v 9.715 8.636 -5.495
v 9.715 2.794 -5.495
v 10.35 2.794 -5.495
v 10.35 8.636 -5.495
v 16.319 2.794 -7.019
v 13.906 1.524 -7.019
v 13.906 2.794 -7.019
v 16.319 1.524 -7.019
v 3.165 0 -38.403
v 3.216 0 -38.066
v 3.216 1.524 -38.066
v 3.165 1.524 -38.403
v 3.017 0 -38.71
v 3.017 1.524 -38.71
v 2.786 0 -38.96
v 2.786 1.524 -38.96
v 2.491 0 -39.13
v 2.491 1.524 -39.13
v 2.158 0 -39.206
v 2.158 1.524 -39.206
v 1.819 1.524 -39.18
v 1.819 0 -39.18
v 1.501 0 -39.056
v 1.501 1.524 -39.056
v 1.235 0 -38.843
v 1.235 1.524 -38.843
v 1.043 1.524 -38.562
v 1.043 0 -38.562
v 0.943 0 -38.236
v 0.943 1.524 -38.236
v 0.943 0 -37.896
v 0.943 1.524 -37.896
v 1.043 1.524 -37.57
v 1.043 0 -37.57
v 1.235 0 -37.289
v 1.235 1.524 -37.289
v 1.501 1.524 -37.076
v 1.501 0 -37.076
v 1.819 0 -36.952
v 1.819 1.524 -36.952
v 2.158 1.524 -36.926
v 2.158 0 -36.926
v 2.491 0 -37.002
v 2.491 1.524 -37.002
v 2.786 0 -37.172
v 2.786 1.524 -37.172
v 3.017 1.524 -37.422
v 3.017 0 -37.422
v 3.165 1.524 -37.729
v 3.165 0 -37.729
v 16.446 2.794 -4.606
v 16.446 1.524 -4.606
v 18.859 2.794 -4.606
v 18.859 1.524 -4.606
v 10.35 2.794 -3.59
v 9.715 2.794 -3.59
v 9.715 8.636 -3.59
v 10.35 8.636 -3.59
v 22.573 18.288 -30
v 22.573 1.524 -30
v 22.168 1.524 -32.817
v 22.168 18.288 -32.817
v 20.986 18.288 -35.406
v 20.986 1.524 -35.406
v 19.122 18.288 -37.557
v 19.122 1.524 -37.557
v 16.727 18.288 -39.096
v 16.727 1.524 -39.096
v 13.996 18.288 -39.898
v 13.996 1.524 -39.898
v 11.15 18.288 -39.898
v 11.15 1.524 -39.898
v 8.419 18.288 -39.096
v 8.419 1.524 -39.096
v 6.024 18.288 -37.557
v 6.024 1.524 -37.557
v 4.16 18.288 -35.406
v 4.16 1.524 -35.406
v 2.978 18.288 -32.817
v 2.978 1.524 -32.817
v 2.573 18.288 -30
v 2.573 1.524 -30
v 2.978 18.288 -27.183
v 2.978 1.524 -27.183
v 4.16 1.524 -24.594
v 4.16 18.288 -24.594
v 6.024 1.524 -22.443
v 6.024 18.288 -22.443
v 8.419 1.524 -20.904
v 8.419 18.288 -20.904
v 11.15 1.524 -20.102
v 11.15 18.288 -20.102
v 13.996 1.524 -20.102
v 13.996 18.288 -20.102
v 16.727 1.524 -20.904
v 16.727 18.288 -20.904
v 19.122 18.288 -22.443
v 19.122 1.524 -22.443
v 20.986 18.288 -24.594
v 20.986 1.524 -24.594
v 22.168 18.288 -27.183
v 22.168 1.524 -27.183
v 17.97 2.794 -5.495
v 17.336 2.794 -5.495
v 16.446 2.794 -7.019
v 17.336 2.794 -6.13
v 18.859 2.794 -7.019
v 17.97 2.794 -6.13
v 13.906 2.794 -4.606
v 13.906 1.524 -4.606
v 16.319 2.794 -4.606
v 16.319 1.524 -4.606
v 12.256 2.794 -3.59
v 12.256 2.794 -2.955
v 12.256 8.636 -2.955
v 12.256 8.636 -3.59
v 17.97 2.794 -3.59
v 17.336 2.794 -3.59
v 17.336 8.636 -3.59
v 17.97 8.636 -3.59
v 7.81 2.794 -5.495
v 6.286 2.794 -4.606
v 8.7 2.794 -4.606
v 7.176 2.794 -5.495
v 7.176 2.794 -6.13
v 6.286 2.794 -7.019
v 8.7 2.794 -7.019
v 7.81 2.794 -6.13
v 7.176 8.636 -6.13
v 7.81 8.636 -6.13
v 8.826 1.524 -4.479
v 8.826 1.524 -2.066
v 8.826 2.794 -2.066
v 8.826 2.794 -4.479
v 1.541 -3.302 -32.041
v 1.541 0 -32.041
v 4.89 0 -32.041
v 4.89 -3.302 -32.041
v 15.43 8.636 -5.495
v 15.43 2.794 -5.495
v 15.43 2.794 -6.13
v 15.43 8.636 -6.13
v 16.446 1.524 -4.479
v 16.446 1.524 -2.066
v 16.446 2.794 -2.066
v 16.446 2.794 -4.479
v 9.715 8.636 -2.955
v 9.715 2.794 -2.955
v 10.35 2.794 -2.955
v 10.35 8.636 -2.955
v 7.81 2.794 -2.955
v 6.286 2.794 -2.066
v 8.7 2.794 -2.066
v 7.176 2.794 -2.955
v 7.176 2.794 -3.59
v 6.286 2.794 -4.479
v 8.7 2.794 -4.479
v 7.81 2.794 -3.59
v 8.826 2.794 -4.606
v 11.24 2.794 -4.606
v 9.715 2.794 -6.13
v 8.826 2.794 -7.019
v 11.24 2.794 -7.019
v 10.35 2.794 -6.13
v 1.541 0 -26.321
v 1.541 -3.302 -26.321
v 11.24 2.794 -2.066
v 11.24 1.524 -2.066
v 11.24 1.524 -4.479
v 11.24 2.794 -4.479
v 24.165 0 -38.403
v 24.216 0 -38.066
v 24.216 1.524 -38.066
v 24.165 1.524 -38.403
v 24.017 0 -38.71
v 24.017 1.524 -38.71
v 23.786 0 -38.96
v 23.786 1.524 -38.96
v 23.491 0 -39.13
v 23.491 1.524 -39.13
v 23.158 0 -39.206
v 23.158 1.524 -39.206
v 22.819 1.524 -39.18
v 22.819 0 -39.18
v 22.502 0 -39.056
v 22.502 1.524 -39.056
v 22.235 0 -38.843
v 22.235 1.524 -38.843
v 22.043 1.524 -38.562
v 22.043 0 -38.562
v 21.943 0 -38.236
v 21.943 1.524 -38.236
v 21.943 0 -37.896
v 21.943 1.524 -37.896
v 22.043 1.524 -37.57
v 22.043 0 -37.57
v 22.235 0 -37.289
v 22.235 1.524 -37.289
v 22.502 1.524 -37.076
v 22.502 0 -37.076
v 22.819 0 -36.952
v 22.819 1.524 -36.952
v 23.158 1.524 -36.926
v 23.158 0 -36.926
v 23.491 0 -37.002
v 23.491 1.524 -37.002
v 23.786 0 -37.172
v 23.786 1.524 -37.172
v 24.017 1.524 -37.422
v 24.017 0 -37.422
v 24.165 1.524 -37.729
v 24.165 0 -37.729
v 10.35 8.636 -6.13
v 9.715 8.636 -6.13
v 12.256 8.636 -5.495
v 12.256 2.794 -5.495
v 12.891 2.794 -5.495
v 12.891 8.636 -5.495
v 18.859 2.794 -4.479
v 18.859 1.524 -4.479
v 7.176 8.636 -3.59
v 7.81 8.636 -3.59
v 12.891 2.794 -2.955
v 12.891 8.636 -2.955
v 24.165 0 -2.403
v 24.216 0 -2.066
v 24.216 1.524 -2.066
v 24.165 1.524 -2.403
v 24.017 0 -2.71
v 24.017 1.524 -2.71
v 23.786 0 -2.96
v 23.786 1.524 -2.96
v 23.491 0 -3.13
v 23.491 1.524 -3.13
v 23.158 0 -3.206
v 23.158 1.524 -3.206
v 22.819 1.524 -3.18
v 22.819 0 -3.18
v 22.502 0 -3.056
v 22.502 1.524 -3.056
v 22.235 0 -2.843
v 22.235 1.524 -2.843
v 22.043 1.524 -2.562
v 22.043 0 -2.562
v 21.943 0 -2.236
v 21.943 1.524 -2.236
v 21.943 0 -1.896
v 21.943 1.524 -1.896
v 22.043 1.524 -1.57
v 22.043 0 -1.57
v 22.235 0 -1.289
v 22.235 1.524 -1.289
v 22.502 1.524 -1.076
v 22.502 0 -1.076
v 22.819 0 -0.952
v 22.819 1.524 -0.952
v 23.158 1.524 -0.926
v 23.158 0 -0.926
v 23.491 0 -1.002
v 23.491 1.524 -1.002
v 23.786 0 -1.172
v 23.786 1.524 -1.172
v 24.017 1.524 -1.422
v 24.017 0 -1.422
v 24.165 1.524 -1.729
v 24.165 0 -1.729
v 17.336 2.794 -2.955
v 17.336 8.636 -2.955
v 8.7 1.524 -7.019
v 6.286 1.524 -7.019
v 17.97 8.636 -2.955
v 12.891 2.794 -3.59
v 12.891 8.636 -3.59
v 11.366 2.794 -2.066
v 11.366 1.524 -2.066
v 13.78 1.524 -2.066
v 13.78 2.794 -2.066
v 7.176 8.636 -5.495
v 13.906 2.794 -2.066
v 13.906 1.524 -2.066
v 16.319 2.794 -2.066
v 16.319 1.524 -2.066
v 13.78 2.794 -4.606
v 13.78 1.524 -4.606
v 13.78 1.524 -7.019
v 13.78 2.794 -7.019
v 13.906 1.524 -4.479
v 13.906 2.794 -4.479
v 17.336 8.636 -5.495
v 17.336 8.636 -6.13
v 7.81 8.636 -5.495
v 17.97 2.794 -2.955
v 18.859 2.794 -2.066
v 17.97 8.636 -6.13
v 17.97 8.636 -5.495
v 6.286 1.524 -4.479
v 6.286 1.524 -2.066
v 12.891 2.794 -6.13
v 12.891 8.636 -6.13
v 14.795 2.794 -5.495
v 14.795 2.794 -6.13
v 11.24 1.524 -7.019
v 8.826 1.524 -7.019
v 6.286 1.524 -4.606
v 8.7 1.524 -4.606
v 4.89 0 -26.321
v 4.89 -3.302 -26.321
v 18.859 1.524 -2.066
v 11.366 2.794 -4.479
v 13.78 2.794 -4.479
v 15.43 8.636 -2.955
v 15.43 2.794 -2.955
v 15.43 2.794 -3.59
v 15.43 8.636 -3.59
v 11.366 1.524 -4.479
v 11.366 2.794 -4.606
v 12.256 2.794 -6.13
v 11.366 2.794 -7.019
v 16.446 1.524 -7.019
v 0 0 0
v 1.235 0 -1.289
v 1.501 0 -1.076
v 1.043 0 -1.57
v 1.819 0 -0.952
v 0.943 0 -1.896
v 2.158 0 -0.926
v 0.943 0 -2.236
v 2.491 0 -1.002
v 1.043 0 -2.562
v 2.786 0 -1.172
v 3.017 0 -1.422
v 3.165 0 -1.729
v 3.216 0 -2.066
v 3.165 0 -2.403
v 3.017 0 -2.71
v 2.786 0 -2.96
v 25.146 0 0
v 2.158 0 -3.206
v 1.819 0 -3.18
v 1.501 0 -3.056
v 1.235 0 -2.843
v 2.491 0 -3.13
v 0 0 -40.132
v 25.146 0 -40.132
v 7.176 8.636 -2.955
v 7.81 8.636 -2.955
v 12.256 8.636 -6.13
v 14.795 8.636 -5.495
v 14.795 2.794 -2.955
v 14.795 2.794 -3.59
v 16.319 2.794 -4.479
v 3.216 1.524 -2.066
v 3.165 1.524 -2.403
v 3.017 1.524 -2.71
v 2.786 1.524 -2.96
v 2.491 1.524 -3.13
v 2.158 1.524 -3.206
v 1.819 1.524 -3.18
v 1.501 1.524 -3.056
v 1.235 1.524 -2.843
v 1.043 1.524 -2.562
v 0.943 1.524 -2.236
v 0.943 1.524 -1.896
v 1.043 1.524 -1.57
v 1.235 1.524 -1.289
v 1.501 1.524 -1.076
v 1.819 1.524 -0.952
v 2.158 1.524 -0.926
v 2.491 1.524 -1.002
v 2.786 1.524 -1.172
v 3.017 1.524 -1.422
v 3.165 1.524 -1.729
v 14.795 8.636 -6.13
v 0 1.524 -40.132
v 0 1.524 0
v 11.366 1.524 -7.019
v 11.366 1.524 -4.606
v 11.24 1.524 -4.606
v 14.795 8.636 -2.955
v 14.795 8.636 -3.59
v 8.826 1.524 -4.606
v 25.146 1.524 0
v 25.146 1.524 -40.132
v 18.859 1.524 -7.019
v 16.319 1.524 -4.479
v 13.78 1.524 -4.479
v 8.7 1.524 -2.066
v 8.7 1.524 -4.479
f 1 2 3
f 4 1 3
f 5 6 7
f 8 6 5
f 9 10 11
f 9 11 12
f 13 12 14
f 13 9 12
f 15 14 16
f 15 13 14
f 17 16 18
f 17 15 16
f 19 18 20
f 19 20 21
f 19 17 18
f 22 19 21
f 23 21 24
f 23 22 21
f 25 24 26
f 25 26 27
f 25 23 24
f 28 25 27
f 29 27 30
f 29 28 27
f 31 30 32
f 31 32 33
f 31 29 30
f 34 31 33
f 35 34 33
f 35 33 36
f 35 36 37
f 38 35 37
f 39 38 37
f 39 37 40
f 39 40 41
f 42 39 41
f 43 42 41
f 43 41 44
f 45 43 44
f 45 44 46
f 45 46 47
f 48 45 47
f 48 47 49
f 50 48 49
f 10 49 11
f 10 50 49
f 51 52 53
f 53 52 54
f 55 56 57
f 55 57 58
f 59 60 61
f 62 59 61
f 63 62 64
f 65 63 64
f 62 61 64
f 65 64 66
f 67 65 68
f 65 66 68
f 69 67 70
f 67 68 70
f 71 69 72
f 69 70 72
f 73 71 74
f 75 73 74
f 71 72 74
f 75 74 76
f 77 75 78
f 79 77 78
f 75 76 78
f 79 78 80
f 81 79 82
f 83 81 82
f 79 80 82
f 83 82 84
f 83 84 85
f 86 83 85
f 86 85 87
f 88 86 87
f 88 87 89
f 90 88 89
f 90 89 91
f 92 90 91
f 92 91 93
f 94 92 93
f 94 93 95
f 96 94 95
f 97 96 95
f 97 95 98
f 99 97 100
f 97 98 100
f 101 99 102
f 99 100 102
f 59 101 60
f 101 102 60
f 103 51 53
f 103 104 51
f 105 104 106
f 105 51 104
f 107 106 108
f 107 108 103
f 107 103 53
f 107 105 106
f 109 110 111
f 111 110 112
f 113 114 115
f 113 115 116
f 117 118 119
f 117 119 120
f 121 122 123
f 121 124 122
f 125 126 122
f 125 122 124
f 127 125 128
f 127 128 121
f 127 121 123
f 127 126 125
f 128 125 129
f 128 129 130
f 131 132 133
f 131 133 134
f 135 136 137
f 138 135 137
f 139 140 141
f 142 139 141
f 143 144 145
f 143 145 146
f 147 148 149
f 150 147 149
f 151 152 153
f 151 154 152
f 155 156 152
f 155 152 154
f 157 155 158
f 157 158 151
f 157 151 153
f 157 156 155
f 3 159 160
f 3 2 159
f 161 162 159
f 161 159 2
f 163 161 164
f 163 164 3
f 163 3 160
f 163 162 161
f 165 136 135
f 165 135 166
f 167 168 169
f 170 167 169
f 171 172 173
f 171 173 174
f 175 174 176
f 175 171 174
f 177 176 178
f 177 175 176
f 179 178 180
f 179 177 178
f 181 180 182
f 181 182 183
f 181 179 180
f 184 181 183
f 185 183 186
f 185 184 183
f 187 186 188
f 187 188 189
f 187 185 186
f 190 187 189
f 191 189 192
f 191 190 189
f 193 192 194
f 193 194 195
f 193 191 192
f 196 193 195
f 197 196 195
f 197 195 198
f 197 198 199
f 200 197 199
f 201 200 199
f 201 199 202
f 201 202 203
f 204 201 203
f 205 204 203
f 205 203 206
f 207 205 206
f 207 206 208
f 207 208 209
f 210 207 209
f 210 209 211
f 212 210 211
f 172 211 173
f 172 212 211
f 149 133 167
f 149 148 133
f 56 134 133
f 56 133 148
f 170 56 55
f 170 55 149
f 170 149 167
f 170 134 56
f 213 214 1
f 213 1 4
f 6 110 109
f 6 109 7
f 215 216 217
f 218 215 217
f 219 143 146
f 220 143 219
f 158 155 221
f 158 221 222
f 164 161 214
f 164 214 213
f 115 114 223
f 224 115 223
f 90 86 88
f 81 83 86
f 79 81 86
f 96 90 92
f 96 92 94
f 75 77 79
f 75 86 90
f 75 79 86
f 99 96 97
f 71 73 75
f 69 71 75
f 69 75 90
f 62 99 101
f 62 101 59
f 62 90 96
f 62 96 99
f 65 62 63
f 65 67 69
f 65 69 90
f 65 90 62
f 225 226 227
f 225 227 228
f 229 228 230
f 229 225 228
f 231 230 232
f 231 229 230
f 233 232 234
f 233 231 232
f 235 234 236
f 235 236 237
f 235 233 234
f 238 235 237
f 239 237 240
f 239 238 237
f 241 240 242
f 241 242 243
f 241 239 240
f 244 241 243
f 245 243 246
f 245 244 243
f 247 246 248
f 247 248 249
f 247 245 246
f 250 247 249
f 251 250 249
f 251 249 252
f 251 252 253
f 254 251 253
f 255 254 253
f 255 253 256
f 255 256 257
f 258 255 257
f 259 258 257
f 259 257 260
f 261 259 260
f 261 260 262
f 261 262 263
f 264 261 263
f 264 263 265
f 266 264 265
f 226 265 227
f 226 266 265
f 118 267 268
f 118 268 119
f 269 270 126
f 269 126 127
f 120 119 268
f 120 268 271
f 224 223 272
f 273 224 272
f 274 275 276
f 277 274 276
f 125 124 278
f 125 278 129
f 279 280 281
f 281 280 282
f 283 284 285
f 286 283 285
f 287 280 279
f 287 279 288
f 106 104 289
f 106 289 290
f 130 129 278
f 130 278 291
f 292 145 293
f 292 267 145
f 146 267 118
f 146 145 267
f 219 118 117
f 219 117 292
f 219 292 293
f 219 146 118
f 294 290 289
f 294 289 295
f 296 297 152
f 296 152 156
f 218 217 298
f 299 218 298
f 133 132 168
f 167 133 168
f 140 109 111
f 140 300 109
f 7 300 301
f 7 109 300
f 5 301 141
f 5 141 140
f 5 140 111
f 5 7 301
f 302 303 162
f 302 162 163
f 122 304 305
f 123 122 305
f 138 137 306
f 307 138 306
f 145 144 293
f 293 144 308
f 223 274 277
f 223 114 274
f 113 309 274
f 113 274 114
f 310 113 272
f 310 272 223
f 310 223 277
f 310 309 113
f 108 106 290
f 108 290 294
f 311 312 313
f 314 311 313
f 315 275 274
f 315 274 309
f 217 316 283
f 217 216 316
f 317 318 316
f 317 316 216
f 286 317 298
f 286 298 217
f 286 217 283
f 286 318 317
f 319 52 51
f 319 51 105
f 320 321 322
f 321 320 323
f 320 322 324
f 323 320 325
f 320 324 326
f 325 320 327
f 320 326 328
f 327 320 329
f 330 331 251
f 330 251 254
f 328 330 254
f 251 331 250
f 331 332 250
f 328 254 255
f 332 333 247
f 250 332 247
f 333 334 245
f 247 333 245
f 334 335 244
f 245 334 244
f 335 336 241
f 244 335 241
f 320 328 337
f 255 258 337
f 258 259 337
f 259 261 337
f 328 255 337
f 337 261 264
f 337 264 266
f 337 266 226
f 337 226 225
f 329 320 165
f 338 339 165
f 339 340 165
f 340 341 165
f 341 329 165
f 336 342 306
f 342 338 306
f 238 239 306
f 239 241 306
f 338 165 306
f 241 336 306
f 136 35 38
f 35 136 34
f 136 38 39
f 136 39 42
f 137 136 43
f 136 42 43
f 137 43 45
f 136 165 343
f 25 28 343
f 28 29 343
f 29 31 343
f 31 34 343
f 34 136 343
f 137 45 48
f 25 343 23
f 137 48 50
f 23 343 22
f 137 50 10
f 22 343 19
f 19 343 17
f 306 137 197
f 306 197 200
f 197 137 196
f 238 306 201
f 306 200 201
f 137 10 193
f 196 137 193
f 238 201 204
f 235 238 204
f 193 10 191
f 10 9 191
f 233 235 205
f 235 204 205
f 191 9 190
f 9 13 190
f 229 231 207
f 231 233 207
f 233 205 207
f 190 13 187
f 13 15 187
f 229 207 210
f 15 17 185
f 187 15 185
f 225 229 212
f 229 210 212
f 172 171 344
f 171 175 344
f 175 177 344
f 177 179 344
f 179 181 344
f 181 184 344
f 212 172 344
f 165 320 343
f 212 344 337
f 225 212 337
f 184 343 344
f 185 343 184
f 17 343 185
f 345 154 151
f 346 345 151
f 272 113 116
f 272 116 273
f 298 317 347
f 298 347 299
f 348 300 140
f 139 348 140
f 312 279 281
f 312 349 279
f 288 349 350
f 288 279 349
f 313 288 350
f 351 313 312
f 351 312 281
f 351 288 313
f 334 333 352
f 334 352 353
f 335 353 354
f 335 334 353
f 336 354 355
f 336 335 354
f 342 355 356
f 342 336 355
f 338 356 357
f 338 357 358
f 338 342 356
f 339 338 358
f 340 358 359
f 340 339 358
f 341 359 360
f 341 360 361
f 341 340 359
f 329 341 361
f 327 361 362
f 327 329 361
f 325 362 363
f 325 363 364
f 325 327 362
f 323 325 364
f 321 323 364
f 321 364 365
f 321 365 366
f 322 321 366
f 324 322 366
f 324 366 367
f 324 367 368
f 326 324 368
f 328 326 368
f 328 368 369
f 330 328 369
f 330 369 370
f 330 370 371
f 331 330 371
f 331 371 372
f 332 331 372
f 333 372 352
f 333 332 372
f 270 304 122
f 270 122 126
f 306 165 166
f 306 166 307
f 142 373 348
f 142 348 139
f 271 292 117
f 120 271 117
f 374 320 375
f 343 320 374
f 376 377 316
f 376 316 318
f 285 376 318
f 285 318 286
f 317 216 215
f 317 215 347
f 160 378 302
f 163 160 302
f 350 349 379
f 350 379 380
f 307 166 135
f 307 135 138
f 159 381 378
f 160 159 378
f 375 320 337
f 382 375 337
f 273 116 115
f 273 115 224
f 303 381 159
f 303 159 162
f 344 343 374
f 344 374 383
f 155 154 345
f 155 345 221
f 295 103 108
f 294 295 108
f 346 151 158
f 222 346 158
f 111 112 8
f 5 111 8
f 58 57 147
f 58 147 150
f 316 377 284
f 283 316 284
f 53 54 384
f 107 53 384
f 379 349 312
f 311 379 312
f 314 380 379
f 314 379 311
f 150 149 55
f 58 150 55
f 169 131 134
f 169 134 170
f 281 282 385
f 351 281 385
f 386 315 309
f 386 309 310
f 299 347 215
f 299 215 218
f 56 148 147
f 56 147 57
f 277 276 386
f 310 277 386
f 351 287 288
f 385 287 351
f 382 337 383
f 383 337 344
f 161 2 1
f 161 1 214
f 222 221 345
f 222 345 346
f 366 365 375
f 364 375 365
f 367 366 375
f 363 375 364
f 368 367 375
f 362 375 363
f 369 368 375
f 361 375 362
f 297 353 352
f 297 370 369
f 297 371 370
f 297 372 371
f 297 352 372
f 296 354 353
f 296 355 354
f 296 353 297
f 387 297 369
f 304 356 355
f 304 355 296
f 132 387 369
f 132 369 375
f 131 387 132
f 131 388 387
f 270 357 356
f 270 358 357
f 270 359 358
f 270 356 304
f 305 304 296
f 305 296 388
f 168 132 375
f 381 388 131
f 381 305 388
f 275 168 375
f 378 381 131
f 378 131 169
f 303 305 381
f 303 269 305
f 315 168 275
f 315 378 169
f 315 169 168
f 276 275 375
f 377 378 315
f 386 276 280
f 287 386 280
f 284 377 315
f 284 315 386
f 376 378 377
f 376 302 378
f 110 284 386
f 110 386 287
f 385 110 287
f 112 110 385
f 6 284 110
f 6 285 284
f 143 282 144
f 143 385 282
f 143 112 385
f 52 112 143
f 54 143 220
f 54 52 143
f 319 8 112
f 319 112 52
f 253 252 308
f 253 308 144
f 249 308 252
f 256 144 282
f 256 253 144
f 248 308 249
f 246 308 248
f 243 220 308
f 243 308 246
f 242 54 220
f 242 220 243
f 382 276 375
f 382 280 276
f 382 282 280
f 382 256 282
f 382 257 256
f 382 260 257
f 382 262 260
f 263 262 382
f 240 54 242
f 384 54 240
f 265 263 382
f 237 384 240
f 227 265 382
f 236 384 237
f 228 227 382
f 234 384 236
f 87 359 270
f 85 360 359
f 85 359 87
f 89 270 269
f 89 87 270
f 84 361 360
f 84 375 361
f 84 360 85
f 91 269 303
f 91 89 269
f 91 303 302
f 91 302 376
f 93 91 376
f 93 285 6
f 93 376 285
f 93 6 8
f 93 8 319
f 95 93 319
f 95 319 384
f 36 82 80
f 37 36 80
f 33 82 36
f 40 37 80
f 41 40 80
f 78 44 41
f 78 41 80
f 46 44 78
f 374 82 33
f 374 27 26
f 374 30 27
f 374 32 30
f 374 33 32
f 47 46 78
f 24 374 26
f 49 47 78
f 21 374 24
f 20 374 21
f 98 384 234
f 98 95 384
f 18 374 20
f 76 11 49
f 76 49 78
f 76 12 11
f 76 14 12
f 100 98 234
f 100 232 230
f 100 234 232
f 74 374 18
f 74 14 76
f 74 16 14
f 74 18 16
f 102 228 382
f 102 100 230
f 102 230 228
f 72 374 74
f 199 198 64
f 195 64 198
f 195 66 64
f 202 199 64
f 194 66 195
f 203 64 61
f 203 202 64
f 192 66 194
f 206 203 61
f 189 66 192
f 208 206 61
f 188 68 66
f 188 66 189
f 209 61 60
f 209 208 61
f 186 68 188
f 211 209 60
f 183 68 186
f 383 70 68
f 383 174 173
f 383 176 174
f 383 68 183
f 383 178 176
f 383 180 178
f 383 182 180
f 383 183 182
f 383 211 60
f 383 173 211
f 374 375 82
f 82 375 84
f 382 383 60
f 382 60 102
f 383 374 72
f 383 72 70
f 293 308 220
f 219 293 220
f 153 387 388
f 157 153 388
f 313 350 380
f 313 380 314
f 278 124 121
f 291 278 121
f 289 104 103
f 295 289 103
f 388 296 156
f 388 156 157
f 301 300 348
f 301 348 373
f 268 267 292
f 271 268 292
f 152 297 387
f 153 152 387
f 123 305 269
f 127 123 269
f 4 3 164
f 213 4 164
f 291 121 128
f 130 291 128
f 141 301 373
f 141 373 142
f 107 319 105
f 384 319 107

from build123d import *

# Parameters (mm, degrees)
SKETCH1_W           = 25.146
SKETCH1_H           = 40.132
SKETCH1_R           = 1.143
BOSS_EXTRUDE1_DEPTH = 1.524
SKETCH2_R           = 10
BOSS_EXTRUDE2_DEPTH = 16.764
SKETCH3_W           = 2.413
SKETCH3_H           = 2.413
BOSS_EXTRUDE3_DEPTH = 1.27
SKETCH4_W           = 0.635
SKETCH4_H           = 0.635
BOSS_EXTRUDE4_DEPTH = 5.842
SKETCH5_W           = 3.348930747
SKETCH5_H           = 5.720091757
BOSS_EXTRUDE5_DEPTH = 3.302


with BuildPart() as part:
    # Sketch1 → Boss-Extrude1 (new body)
    with BuildSketch(Plane(origin=(0, 0, 0), x_dir=(1, 0, 0), z_dir=(0, 1, 0))):
        with Locations((12.573, 20.066)):
            Rectangle(SKETCH1_W, SKETCH1_H)
        with Locations((2.073, 38.066)):
            Circle(SKETCH1_R, mode=Mode.SUBTRACT)
        with Locations((23.073, 38.066)):
            Circle(SKETCH1_R, mode=Mode.SUBTRACT)
        with Locations((23.073, 2.066)):
            Circle(SKETCH1_R, mode=Mode.SUBTRACT)
        with Locations((2.073, 2.066)):
            Circle(SKETCH1_R, mode=Mode.SUBTRACT)
    extrude(amount=BOSS_EXTRUDE1_DEPTH)

    # Sketch2 → Boss-Extrude2 (add)
    with BuildSketch(Plane(origin=(0, 1.524, 0), x_dir=(1, 0, 0), z_dir=(0, 1, 0))):
        with Locations((12.573, 30)):
            Circle(SKETCH2_R)
    extrude(amount=BOSS_EXTRUDE2_DEPTH)

    # Sketch3 → Boss-Extrude3 (add)
    with BuildSketch(Plane(origin=(0, 1.524, 0), x_dir=(1, 0, 0), z_dir=(0, 1, 0))):
        with Locations((7.493, 3.2725)):
            Rectangle(SKETCH3_W, SKETCH3_H)
        with Locations((10.033, 3.2725)):
            Rectangle(SKETCH3_W, SKETCH3_H)
        with Locations((12.573, 3.2725)):
            Rectangle(SKETCH3_W, SKETCH3_H)
        with Locations((15.113, 3.2725)):
            Rectangle(SKETCH3_W, SKETCH3_H)
        with Locations((17.653, 3.2725)):
            Rectangle(SKETCH3_W, SKETCH3_H)
        with Locations((7.493, 5.8125)):
            Rectangle(SKETCH3_W, SKETCH3_H)
        with Locations((10.033, 5.8125)):
            Rectangle(SKETCH3_W, SKETCH3_H)
        with Locations((12.573, 5.8125)):
            Rectangle(SKETCH3_W, SKETCH3_H)
        with Locations((15.113, 5.8125)):
            Rectangle(SKETCH3_W, SKETCH3_H)
        with Locations((17.653, 5.8125)):
            Rectangle(SKETCH3_W, SKETCH3_H)
    extrude(amount=BOSS_EXTRUDE3_DEPTH)

    # Sketch4 → Boss-Extrude4 (add)
    with BuildSketch(Plane(origin=(0, 2.794, 0), x_dir=(1, 0, 0), z_dir=(0, 1, 0))):
        with Locations((10.033, 3.2725)):
            Rectangle(SKETCH4_W, SKETCH4_H)
        with Locations((7.493, 3.2725)):
            Rectangle(SKETCH4_W, SKETCH4_H)
        with Locations((12.573, 3.2725)):
            Rectangle(SKETCH4_W, SKETCH4_H)
        with Locations((15.113, 3.2725)):
            Rectangle(SKETCH4_W, SKETCH4_H)
        with Locations((17.653, 3.2725)):
            Rectangle(SKETCH4_W, SKETCH4_H)
        with Locations((10.033, 5.8125)):
            Rectangle(SKETCH4_W, SKETCH4_H)
        with Locations((12.573, 5.8125)):
            Rectangle(SKETCH4_W, SKETCH4_H)
        with Locations((15.113, 5.8125)):
            Rectangle(SKETCH4_W, SKETCH4_H)
        with Locations((17.653, 5.8125)):
            Rectangle(SKETCH4_W, SKETCH4_H)
        with Locations((7.493, 5.8125)):
            Rectangle(SKETCH4_W, SKETCH4_H)
    extrude(amount=BOSS_EXTRUDE4_DEPTH)

    # Sketch5 → Boss-Extrude5 (add)
    with BuildSketch(Plane.XZ):
        with Locations((3.215733766, -29.18090344)):
            Rectangle(SKETCH5_W, SKETCH5_H)
    extrude(amount=BOSS_EXTRUDE5_DEPTH)


solid = part.part
